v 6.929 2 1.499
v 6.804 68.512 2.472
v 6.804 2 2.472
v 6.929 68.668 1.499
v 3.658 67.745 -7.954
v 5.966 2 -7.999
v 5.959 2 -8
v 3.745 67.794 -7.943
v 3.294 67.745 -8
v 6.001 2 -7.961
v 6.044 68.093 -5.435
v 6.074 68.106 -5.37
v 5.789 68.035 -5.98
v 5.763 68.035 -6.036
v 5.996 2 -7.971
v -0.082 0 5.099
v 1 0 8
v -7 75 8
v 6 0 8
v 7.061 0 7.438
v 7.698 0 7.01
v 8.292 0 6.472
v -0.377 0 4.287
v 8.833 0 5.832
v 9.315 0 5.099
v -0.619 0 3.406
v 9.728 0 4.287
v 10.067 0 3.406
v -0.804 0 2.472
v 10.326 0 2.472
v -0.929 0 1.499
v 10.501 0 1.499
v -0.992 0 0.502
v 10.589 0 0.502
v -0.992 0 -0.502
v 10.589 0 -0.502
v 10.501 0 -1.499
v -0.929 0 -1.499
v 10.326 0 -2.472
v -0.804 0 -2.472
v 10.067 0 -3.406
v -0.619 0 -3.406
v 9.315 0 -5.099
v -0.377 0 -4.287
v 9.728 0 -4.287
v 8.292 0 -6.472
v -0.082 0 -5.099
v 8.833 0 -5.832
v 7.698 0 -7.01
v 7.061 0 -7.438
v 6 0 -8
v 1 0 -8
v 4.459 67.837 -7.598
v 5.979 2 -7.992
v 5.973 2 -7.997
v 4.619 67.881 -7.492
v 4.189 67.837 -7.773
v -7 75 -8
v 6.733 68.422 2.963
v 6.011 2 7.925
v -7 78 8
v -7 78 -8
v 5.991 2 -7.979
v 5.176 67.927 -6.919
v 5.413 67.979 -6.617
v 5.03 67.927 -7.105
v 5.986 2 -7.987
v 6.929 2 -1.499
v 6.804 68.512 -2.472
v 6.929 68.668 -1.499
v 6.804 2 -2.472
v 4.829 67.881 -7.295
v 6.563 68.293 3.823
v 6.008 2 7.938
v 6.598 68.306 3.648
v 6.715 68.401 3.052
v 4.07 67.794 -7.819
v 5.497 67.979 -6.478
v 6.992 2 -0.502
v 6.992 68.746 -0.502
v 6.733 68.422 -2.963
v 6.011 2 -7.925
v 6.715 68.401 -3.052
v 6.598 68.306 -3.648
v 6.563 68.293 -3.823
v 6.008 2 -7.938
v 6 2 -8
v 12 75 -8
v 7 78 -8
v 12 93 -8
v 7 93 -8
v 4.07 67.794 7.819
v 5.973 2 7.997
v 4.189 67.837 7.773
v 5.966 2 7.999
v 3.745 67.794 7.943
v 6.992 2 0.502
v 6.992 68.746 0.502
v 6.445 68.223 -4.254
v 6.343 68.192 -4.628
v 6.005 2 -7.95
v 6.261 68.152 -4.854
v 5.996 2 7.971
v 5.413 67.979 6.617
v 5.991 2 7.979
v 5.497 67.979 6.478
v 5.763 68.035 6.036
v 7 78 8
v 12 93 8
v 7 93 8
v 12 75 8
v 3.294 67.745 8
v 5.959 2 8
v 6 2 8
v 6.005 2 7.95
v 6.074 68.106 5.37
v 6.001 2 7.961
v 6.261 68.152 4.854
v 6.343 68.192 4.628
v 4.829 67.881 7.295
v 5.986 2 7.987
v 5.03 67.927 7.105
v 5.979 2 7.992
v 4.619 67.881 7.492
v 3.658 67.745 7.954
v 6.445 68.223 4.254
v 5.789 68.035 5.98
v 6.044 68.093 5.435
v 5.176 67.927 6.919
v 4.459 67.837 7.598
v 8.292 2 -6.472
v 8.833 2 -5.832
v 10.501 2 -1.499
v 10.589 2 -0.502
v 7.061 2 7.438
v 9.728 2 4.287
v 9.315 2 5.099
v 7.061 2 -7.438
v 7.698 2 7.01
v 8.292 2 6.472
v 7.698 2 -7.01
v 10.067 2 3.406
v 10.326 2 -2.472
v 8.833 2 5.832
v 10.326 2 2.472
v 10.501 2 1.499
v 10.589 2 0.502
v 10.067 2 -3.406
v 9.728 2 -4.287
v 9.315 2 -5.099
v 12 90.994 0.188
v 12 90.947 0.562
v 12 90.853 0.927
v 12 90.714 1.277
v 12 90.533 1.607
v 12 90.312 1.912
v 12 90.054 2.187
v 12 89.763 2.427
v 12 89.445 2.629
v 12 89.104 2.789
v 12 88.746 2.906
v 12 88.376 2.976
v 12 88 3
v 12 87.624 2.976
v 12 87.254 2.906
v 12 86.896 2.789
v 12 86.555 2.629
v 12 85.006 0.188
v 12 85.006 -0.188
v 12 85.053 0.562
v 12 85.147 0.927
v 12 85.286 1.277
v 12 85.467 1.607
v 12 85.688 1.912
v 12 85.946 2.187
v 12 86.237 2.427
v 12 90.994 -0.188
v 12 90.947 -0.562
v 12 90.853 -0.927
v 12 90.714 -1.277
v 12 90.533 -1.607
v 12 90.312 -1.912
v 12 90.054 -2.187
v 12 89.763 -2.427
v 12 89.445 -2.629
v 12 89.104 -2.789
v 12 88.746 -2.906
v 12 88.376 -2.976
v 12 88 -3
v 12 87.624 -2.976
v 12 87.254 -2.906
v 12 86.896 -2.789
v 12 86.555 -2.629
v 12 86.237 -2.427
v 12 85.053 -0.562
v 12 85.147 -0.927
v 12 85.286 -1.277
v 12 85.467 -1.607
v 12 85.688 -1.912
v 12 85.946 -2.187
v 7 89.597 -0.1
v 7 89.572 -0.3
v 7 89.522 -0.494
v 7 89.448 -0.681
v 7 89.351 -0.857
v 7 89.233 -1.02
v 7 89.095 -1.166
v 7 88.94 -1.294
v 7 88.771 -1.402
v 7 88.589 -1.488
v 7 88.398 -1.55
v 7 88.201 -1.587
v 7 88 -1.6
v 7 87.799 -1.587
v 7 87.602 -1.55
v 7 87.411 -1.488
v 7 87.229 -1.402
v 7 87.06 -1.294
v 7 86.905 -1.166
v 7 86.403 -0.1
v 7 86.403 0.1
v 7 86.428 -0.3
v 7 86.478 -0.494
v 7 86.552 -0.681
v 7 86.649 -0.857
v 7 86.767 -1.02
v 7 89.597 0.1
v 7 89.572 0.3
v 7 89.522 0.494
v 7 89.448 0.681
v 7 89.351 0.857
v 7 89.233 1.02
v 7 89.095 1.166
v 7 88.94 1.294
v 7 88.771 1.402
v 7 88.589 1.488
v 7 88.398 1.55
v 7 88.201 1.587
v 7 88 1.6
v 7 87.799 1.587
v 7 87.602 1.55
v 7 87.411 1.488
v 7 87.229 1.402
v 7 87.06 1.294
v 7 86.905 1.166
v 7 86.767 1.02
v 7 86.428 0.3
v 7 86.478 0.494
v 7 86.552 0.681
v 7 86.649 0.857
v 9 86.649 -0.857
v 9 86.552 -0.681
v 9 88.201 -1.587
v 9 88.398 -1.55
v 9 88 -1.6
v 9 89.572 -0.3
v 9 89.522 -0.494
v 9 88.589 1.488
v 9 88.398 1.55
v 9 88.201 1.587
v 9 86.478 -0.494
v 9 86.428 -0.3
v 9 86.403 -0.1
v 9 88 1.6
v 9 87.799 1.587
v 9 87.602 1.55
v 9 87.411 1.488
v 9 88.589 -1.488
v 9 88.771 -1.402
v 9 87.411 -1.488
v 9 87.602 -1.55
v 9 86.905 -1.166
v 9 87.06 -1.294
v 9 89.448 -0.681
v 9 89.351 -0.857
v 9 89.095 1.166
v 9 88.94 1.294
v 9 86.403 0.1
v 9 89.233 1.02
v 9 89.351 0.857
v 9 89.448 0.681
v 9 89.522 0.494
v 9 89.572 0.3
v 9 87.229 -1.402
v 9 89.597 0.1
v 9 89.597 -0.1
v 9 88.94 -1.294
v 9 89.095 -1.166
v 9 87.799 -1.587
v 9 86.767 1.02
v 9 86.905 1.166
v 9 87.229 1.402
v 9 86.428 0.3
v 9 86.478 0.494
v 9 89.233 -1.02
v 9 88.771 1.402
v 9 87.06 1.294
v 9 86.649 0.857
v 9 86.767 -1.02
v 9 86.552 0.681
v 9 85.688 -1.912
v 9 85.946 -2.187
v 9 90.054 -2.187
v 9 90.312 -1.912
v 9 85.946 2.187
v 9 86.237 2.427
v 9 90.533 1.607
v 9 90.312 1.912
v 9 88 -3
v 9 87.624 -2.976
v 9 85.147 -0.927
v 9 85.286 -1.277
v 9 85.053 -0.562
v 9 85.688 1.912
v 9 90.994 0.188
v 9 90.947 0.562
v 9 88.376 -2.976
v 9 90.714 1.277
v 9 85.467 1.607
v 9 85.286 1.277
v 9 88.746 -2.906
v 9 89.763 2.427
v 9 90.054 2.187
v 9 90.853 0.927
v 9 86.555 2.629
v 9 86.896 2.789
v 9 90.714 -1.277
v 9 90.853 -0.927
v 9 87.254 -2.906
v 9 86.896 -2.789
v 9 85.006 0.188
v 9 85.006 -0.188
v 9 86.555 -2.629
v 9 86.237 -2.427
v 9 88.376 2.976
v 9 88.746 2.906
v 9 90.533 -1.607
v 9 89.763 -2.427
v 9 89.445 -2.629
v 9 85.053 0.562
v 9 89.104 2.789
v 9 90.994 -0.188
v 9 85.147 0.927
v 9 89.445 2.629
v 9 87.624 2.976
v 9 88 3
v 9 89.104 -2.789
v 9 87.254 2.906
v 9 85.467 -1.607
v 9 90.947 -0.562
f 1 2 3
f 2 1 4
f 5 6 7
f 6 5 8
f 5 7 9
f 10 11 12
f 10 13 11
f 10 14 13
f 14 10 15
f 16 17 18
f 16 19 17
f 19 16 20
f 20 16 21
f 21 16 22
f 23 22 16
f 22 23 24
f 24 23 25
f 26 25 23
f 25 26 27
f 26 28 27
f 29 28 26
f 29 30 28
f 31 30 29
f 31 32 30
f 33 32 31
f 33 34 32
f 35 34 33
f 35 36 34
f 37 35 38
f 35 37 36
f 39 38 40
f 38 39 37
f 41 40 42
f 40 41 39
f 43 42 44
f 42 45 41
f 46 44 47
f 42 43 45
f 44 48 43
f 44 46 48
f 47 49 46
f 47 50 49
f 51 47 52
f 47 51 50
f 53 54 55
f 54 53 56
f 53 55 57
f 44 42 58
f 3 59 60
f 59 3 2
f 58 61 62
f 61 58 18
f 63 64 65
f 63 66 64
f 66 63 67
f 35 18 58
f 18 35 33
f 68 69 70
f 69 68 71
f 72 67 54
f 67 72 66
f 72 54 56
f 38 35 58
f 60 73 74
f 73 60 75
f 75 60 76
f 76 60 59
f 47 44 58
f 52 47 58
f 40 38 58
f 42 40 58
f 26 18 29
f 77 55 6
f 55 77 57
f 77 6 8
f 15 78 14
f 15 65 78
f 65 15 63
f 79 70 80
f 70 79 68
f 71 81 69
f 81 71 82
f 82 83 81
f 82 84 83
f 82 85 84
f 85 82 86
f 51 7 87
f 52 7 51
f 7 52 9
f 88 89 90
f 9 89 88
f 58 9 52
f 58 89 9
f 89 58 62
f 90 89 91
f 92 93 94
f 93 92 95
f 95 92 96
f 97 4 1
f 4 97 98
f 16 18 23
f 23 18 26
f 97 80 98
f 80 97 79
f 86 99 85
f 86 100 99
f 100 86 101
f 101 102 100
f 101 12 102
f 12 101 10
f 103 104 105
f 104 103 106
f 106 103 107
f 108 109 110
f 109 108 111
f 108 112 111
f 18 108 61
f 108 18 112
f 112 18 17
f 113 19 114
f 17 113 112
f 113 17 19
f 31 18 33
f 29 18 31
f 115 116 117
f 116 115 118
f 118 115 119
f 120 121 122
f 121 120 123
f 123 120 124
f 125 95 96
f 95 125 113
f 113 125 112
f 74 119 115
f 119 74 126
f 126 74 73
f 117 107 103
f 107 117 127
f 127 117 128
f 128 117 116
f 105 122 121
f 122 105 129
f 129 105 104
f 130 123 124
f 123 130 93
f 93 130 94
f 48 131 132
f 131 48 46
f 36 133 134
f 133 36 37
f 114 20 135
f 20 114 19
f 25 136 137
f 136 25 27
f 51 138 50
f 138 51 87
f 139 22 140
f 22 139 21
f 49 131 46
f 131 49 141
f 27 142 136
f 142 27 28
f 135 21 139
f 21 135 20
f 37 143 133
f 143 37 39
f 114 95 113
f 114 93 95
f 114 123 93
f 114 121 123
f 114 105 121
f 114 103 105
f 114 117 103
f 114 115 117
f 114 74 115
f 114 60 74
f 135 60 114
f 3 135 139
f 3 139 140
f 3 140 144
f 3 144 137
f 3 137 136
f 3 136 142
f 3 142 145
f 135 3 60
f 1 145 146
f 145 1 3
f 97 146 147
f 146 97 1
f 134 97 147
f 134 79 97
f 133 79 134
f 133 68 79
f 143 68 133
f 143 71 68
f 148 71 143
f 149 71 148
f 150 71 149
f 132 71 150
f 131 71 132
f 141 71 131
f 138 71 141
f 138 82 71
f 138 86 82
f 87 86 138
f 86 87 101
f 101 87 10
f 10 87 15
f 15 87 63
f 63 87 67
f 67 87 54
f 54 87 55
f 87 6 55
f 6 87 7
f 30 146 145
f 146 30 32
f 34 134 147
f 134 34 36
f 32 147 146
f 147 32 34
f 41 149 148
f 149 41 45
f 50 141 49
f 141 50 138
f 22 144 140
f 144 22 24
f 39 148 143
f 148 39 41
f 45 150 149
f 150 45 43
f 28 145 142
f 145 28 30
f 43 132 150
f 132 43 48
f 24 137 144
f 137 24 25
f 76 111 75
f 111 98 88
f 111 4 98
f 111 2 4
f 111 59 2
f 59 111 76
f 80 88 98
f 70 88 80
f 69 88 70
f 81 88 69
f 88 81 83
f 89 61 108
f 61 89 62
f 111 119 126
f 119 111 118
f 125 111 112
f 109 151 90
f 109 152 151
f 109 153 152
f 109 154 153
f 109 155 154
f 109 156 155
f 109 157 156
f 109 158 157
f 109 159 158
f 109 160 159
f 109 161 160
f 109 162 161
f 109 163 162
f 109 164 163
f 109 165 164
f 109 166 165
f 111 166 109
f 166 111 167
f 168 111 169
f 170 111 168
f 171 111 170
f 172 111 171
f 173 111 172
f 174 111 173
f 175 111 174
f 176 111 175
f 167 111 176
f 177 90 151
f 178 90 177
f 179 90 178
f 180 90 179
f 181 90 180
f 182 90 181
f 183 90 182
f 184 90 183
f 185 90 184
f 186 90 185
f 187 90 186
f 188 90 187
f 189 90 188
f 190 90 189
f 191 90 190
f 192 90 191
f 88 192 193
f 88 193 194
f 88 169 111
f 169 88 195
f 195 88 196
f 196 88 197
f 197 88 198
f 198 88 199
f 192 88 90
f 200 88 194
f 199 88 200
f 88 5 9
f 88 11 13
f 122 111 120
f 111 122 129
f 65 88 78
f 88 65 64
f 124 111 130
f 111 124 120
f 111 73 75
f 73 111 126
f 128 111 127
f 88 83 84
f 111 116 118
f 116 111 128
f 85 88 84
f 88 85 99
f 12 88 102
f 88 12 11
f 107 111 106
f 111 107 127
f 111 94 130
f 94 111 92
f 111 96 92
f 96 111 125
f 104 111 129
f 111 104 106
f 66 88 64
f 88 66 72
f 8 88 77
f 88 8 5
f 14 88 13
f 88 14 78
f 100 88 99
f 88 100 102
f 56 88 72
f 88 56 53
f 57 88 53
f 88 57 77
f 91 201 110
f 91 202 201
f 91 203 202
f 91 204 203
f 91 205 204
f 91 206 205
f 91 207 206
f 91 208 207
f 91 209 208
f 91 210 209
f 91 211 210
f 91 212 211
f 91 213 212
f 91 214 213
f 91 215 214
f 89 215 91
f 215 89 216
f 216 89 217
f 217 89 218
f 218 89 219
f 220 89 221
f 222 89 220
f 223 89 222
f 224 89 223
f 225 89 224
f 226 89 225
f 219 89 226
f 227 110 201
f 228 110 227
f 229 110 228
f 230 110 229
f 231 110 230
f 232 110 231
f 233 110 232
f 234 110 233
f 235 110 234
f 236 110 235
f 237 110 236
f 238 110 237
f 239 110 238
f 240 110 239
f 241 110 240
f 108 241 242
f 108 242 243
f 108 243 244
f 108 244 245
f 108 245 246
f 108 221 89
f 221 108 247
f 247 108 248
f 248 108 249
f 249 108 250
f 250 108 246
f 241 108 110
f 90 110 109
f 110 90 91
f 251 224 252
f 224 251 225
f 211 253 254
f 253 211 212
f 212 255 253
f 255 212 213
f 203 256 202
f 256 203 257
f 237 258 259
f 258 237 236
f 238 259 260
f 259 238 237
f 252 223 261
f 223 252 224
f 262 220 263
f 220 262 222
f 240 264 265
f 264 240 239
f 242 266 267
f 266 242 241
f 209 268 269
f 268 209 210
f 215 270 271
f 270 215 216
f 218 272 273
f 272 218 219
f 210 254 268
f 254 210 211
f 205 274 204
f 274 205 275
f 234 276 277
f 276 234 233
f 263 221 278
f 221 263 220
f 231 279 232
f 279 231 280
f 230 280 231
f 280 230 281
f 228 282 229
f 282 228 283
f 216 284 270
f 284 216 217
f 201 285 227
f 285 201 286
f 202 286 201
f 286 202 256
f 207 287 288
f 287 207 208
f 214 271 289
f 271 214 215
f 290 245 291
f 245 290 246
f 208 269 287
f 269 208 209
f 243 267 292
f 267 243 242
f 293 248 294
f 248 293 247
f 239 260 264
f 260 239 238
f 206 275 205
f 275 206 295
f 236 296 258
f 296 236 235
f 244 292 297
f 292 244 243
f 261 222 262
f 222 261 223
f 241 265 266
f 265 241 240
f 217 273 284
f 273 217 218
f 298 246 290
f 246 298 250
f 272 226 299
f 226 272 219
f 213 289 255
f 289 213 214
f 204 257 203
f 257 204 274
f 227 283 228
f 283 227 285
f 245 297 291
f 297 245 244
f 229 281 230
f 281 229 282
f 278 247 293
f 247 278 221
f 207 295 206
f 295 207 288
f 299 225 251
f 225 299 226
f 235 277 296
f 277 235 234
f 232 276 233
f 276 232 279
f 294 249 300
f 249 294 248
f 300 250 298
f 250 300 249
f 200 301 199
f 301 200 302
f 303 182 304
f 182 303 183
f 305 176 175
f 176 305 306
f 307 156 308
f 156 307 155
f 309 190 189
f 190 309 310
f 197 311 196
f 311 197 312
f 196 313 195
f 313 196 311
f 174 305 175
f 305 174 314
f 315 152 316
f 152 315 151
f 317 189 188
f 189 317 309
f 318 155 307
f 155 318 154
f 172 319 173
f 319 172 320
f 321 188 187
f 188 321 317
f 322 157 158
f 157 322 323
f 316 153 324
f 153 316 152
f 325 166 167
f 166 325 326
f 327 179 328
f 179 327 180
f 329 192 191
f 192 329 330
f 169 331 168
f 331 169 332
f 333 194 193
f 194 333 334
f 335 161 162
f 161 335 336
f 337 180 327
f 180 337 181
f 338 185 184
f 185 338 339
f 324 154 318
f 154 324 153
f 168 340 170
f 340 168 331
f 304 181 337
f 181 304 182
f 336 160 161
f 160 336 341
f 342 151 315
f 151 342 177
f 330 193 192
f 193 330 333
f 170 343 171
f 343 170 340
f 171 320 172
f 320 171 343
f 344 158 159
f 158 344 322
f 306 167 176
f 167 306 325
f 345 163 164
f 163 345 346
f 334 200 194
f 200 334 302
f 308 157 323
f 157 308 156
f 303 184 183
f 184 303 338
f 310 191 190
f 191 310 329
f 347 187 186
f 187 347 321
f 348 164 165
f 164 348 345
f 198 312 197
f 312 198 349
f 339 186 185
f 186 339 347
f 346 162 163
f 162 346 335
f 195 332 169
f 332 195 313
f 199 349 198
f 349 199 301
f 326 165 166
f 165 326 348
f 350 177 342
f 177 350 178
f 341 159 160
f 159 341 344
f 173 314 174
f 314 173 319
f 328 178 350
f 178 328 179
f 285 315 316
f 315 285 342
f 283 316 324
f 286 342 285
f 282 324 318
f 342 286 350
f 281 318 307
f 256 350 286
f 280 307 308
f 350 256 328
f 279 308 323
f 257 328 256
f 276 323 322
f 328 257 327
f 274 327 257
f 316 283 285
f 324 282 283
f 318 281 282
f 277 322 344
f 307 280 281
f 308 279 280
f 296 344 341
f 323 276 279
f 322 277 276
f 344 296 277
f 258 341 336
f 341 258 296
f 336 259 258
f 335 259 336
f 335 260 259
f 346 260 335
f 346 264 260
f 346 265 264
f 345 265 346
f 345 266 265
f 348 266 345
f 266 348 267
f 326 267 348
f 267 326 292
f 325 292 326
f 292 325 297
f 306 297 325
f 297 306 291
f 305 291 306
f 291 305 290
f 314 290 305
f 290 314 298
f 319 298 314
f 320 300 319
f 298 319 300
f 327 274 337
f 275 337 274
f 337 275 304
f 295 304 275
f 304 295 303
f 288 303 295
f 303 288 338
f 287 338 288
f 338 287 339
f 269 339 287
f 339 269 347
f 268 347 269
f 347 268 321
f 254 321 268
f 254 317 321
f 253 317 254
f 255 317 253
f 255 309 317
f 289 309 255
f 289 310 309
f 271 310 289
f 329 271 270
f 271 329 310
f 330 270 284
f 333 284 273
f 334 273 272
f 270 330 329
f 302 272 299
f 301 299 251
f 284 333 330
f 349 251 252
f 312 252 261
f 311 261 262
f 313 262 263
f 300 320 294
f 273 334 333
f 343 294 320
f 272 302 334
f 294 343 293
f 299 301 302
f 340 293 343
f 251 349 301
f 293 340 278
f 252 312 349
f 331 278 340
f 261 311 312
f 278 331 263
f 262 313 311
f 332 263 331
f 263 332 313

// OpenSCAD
$fn=50;





module holder(height){

difference(){
	union(){
		hull () {
			translate([0,-3,0]) scale([1,0.5,1])	cylinder (height,8,8);
			translate([-8,-6,0])cube([16,5,1]);
			translate([-8,2,height])cube([16,5,1]);
		}
		hull () {
			translate([0,-5,0]) 	scale([1,0.7,1])cylinder (2,8,8);
			translate([-8,-6,0])cube([16,5,2]);
		}
	//top
	hull(){
		translate([-8,-12,height]) cube ([16,19,3]);
		translate([0,0,height-10])	scale([1,0.5,1])	cylinder (5,8,5);
	}
	
	translate([-8,-7,height])rotate([90,0,0]) cube ([16,18,5]);



	}
	



#	translate([0,-2,height+3+10])rotate([90,0,0]) cylinder(10,1.6,1.6);
#	translate([0,-9,height+3+10])rotate([90,0,0]) cylinder(3,3,3);



	}


}



translate([0,0,0])rotate([270,90,0]) holder (75);
